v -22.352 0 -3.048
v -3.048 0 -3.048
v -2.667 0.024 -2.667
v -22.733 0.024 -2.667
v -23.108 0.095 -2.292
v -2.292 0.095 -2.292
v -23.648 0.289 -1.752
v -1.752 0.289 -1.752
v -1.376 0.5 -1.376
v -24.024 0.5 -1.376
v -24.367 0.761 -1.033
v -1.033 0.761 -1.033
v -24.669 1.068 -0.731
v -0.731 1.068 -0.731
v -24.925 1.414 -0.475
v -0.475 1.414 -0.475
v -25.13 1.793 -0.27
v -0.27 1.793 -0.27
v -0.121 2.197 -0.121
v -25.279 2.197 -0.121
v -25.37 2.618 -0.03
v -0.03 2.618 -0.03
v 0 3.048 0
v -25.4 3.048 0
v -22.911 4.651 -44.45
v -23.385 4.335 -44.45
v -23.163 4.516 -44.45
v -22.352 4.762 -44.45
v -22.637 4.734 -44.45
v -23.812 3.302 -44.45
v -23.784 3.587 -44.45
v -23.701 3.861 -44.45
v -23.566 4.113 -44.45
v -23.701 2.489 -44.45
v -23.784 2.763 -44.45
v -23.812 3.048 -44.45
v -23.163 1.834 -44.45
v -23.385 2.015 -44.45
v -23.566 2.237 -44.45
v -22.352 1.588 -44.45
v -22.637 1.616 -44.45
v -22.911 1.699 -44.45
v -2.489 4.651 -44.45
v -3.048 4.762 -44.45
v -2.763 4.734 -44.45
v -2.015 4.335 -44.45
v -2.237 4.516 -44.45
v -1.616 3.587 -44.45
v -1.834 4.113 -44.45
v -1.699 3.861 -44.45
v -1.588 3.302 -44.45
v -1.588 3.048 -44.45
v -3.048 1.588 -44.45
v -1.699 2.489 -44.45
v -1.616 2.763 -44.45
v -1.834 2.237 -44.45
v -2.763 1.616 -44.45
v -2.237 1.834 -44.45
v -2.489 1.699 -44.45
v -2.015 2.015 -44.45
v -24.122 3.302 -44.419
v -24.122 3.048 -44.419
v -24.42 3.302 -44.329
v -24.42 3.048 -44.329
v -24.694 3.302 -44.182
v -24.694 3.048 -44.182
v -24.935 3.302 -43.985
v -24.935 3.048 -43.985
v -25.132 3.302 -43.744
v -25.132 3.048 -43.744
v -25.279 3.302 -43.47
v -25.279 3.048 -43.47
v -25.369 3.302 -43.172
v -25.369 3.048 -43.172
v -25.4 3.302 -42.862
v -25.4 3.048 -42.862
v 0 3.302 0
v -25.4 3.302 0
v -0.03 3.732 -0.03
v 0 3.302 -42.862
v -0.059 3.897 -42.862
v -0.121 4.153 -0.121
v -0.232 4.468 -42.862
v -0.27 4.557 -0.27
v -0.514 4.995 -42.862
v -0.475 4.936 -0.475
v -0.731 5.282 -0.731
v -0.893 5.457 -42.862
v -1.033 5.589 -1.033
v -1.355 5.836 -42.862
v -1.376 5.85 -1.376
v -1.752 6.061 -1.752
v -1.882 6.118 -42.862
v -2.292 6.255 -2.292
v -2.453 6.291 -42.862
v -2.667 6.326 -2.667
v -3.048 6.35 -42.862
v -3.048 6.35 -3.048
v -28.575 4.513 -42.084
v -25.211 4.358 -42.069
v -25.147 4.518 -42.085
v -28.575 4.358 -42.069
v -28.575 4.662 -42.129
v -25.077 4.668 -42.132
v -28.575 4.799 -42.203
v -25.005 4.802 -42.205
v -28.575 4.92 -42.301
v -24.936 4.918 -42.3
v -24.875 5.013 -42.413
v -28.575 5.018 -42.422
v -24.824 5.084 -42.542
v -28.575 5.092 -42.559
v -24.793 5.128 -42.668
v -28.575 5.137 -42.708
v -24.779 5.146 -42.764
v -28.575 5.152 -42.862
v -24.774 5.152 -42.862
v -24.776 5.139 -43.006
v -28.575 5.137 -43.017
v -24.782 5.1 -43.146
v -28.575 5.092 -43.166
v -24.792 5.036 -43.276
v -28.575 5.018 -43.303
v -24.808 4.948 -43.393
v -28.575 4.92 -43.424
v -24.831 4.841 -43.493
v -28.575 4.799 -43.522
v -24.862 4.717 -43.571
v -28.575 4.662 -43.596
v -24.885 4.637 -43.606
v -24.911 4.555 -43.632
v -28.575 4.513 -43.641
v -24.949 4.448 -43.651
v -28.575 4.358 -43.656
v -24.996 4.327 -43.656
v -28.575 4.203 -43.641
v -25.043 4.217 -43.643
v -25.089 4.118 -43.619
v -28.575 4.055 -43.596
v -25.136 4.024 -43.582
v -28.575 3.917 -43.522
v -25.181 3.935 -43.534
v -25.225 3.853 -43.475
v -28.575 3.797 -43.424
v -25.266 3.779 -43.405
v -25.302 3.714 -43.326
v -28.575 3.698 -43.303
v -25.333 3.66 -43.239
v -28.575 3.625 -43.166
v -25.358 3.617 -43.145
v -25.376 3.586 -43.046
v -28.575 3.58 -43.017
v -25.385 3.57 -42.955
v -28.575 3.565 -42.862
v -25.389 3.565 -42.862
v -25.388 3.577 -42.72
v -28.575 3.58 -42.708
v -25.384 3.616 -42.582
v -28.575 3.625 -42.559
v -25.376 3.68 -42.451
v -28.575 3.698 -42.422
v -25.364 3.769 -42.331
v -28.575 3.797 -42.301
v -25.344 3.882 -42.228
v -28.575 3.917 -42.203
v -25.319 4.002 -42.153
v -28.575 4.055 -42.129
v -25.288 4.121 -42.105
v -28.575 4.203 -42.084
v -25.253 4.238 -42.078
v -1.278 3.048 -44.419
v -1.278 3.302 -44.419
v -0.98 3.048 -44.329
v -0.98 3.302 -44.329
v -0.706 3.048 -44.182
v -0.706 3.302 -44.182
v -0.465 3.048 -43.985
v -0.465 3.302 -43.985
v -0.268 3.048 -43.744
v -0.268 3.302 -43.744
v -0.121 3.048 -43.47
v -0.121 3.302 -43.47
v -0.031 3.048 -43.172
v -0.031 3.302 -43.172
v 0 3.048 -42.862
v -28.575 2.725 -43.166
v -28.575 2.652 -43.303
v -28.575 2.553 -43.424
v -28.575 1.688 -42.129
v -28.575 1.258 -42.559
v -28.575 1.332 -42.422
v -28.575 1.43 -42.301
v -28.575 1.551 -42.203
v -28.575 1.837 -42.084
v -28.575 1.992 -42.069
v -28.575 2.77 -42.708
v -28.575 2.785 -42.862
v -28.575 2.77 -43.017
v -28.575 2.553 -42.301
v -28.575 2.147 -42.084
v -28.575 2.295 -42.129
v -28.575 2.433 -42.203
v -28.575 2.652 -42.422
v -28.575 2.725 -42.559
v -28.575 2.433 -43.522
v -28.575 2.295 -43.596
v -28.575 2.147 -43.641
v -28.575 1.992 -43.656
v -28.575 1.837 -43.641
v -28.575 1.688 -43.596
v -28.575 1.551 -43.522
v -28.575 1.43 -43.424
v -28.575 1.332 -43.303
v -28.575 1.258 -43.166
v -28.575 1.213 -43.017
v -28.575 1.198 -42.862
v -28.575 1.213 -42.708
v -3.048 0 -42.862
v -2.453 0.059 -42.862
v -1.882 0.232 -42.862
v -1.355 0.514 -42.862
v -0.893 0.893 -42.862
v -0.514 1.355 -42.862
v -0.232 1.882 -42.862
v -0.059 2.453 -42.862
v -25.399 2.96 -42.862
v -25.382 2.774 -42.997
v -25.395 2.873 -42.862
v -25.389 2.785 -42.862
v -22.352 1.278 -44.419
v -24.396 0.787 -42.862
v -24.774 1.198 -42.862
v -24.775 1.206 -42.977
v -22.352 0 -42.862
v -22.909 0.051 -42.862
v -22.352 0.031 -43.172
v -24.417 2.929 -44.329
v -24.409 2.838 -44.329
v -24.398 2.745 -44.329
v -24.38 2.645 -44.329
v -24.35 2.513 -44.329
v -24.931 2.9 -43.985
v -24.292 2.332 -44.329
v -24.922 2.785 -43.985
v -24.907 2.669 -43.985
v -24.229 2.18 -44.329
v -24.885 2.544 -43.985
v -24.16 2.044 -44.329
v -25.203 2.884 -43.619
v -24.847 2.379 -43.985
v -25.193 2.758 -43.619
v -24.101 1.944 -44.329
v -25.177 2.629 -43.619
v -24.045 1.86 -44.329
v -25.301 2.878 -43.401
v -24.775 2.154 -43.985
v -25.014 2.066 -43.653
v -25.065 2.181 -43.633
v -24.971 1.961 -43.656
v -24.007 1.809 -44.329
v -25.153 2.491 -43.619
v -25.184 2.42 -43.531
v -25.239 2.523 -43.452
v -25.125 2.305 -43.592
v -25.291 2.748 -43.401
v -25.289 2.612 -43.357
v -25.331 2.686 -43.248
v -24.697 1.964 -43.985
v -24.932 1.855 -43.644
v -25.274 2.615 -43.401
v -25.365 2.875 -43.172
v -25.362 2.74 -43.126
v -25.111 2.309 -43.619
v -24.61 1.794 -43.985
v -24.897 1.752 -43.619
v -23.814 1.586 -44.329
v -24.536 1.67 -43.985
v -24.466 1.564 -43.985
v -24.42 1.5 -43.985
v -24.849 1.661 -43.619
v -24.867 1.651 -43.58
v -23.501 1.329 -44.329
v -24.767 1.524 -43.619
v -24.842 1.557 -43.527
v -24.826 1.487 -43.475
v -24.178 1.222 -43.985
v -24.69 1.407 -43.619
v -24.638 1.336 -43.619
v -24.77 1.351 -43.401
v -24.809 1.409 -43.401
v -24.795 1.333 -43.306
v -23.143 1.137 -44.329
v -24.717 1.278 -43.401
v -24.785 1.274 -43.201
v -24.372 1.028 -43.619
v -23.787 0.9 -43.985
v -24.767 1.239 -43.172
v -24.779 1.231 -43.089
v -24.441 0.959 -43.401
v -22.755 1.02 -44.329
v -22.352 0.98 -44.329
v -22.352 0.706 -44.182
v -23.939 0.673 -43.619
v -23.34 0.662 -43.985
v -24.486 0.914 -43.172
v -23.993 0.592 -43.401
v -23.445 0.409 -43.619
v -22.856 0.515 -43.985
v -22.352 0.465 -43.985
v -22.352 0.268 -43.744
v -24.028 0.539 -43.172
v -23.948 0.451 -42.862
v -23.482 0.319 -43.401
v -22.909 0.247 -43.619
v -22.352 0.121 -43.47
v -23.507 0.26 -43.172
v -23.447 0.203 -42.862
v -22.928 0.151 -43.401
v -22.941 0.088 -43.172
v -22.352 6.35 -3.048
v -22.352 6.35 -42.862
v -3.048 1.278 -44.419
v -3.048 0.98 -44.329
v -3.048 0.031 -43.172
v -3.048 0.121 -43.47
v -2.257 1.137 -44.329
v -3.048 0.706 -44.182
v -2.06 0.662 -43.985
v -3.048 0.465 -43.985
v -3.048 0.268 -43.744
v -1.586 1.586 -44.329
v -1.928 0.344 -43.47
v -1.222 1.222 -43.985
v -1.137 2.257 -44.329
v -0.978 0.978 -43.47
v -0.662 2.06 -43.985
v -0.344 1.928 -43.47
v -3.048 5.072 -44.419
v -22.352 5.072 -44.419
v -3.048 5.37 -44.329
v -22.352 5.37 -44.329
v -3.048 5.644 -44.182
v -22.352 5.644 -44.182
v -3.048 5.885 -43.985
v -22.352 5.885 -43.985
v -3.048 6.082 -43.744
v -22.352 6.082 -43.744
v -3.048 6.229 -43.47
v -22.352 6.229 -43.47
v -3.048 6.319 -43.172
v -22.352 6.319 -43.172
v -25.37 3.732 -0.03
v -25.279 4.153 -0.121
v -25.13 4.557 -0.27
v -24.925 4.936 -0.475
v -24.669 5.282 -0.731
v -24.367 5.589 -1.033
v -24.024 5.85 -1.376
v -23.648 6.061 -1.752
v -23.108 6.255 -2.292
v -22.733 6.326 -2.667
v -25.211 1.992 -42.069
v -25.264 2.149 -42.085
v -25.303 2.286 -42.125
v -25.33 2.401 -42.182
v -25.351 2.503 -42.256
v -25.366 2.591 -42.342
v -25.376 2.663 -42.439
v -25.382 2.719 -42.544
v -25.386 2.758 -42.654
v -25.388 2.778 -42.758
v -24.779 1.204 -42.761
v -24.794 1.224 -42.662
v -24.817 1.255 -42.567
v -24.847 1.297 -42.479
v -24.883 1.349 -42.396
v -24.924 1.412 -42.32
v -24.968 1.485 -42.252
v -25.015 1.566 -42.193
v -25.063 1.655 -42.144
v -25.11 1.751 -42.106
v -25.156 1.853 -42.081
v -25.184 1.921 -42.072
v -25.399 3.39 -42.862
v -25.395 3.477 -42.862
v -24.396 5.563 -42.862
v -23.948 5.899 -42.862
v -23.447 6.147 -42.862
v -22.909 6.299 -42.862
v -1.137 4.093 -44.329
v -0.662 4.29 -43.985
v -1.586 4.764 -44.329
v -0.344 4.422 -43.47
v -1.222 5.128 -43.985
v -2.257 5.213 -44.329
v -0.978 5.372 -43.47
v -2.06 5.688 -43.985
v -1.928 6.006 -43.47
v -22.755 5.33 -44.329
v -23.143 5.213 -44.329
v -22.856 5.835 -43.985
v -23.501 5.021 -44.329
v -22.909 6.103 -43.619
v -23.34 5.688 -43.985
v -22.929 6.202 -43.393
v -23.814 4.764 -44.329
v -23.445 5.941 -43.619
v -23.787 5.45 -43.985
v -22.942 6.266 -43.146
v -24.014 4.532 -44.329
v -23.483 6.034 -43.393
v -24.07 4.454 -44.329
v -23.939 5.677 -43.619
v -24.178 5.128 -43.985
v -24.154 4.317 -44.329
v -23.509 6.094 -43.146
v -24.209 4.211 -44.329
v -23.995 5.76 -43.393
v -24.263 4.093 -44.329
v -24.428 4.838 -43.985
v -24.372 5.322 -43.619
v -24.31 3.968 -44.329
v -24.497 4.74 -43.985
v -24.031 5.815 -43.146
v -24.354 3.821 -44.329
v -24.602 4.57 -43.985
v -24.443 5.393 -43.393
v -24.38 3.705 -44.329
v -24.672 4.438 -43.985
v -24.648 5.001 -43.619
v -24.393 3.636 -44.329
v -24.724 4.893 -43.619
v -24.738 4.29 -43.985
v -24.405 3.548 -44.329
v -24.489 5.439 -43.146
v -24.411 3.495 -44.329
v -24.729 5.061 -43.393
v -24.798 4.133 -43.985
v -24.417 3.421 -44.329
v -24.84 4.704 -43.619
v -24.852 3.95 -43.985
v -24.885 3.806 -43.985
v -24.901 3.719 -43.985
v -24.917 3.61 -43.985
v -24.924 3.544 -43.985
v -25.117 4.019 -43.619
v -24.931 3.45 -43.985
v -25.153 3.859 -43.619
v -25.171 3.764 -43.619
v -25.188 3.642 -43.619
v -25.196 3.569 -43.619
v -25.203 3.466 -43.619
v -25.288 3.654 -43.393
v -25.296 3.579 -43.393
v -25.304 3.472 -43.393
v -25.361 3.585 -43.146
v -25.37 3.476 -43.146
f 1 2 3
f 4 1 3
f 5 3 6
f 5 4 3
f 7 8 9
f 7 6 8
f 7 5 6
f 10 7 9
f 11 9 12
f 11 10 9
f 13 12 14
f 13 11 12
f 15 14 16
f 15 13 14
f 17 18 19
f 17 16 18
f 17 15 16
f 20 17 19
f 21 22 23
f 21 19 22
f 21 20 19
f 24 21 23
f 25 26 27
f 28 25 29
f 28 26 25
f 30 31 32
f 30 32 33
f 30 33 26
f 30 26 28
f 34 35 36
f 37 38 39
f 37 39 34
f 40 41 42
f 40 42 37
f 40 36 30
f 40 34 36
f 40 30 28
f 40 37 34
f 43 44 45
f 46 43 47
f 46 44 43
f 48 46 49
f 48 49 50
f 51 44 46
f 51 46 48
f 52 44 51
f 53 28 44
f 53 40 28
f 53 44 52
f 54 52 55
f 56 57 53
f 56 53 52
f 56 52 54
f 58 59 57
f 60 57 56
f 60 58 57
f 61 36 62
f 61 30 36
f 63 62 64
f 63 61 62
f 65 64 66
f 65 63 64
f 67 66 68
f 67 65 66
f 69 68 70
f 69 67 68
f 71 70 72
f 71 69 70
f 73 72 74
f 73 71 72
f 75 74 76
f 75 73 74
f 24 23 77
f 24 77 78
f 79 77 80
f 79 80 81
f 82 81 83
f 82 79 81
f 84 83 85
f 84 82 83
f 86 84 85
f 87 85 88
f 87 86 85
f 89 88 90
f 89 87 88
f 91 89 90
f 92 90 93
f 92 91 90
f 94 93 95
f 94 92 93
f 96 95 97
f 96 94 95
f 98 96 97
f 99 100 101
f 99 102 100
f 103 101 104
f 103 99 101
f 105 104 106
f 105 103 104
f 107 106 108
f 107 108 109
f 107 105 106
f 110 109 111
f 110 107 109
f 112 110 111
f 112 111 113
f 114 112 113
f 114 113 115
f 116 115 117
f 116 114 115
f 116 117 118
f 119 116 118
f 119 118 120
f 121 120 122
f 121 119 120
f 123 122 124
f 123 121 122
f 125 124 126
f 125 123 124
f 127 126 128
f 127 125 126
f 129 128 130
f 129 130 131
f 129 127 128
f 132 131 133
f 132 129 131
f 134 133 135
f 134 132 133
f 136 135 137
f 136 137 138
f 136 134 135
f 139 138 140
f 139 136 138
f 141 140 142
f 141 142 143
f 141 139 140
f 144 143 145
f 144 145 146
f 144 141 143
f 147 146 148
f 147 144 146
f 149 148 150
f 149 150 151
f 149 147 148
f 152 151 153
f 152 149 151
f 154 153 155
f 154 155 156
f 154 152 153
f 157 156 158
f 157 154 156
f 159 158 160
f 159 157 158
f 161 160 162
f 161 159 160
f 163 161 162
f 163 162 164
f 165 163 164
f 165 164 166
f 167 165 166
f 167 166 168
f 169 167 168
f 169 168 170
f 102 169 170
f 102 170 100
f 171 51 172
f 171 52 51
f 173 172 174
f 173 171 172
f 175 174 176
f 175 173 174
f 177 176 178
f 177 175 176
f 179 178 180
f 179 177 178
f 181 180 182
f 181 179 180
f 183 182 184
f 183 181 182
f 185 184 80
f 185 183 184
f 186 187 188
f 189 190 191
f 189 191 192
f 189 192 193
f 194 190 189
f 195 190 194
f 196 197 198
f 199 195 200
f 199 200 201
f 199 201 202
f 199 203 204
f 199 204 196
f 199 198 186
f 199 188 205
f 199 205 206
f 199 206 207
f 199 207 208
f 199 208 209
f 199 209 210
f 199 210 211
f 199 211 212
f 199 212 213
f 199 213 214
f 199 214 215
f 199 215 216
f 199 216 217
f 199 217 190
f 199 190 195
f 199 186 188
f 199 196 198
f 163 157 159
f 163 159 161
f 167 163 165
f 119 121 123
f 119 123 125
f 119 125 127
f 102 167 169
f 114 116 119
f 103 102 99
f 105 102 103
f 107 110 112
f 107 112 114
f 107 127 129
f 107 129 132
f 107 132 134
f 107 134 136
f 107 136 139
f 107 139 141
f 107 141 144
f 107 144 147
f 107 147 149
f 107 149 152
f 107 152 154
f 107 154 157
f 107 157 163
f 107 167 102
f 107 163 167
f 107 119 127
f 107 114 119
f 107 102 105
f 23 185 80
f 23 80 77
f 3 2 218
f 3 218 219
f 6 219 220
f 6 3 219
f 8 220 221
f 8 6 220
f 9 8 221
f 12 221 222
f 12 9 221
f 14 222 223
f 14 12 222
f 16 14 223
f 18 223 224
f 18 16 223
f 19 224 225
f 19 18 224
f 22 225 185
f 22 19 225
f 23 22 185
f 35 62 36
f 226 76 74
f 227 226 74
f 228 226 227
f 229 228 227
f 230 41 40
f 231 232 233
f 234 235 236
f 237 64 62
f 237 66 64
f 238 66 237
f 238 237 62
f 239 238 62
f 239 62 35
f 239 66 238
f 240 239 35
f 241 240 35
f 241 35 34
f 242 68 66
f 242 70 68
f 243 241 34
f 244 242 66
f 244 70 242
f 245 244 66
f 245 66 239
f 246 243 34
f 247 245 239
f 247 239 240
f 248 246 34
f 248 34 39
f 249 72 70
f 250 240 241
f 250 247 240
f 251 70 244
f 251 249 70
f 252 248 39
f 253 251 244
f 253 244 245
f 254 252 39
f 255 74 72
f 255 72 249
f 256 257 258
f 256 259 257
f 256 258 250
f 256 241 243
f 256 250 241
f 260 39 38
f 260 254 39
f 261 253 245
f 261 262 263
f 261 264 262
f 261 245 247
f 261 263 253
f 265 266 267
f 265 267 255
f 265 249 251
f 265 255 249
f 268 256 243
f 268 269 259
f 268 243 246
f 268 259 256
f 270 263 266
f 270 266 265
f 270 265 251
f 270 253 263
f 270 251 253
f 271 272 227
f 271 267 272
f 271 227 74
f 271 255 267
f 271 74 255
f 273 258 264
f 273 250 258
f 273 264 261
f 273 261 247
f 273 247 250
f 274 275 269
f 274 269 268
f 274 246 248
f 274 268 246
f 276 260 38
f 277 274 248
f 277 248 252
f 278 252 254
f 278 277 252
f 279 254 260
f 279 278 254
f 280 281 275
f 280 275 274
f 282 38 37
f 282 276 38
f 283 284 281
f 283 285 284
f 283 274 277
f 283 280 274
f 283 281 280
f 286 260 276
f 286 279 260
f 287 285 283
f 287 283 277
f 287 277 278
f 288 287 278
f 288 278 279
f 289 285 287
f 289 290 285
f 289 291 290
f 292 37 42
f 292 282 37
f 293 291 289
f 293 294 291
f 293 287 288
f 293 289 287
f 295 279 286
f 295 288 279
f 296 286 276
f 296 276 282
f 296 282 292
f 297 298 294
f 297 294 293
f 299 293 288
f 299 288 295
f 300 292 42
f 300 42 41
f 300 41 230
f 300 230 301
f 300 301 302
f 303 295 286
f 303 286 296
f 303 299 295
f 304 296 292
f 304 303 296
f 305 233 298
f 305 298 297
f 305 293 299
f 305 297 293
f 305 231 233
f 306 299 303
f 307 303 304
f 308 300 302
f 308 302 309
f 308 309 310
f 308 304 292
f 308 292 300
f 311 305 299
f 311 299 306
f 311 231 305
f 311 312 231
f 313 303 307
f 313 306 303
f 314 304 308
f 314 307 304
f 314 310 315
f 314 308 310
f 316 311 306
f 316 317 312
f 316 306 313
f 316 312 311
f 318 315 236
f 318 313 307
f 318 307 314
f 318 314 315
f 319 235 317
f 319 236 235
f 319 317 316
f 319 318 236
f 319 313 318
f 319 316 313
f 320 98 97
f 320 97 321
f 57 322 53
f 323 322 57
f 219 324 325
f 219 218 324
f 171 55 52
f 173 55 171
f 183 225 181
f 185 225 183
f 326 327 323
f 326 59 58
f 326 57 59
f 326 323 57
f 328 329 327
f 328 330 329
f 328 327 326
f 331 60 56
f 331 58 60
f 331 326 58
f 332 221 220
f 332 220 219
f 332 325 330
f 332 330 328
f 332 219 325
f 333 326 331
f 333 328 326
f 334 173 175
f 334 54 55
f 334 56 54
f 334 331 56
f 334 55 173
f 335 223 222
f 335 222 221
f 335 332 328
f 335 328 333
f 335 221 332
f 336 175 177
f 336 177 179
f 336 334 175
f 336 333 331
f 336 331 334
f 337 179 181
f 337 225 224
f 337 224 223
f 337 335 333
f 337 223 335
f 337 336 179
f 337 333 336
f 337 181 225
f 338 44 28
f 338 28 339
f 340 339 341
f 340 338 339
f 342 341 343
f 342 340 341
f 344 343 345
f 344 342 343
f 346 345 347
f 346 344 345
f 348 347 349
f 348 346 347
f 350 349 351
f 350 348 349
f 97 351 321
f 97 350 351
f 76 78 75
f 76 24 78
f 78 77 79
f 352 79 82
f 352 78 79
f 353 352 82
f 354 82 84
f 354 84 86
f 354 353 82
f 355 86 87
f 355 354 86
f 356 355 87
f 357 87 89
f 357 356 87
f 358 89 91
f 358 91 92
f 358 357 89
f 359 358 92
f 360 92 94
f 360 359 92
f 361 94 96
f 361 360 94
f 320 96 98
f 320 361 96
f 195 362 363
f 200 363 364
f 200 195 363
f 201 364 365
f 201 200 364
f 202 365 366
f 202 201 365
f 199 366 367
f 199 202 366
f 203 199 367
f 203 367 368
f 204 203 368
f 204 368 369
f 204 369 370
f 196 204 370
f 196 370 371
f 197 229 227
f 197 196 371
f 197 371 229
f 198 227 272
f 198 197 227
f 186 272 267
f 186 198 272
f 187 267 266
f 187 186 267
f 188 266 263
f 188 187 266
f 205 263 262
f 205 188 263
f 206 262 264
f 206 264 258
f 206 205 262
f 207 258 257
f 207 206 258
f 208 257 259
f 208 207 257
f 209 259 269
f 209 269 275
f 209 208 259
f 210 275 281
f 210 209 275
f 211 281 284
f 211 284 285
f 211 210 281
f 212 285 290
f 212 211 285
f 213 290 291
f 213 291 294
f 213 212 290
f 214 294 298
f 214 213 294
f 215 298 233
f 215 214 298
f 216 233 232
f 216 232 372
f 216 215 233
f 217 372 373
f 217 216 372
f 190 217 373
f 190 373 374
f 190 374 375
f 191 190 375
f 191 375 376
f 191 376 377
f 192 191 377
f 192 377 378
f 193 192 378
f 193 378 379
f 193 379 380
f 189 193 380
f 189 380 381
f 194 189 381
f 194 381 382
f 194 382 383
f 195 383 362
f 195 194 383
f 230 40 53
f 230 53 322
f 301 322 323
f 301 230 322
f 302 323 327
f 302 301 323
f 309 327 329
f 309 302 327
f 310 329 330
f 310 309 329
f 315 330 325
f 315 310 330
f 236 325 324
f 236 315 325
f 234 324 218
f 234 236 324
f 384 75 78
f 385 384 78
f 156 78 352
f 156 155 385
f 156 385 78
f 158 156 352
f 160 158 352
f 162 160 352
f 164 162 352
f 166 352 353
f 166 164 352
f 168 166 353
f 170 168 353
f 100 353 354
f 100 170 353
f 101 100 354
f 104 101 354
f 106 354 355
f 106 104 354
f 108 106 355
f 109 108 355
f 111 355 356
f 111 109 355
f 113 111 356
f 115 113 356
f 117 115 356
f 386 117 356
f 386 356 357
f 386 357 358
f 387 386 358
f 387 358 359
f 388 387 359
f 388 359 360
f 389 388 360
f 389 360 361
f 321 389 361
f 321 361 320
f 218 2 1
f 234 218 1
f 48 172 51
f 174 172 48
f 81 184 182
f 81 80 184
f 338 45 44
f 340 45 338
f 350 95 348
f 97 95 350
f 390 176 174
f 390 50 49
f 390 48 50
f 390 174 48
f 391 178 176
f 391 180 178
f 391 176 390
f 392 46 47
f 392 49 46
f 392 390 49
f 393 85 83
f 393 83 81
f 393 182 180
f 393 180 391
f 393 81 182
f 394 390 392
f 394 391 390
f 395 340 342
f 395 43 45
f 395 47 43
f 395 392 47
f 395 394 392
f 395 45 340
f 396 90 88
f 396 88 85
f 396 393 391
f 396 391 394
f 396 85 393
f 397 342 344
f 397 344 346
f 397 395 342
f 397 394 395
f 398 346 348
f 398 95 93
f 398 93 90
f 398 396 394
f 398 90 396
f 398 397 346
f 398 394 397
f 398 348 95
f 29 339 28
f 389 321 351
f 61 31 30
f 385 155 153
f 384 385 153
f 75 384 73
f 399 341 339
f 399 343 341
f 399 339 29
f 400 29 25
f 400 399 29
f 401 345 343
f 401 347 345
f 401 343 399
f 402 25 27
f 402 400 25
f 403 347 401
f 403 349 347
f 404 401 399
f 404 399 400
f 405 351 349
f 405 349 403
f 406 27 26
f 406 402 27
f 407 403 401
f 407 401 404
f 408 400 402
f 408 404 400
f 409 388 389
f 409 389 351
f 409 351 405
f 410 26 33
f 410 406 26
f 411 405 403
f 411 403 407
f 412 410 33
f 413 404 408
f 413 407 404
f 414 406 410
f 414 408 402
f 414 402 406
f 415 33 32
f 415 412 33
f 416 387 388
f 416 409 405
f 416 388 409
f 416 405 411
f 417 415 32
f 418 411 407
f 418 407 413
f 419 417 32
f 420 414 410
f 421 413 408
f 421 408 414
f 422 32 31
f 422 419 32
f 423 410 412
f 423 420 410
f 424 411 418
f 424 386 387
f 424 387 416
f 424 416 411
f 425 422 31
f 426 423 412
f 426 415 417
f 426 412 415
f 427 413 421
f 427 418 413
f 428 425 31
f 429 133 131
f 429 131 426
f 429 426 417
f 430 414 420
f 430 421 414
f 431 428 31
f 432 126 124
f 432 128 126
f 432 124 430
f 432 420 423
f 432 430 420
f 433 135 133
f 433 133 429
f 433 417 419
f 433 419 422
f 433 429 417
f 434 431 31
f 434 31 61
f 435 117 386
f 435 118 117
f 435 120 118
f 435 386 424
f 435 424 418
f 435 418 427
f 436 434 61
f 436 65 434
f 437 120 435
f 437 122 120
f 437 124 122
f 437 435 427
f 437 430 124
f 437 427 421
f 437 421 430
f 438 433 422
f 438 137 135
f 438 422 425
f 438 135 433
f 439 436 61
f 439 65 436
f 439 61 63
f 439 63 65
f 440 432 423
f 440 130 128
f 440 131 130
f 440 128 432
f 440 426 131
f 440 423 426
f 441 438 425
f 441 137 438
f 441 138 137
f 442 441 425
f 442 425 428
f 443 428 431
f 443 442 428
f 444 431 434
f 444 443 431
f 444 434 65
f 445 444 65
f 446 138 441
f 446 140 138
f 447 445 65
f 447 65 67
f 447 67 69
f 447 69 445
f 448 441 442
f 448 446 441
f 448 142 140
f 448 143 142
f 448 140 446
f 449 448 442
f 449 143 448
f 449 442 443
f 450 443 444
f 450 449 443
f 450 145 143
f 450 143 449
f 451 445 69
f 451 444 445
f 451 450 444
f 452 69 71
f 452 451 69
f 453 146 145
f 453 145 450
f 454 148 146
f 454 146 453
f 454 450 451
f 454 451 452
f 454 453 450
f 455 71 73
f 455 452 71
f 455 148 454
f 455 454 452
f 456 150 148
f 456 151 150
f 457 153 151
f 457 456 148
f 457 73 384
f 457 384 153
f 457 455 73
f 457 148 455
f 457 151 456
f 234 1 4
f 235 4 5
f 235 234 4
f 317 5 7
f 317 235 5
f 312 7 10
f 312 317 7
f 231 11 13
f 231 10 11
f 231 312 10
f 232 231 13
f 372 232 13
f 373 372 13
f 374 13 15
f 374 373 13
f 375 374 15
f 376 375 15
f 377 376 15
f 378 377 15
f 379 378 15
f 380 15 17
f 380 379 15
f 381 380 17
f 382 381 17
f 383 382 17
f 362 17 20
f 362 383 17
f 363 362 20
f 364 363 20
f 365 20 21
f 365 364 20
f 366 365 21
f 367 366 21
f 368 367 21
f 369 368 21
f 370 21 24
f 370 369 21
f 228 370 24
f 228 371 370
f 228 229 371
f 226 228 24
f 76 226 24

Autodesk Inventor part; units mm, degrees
ref_plane "YZ Plane" through (0, 0, 0) normal (1, 0, 0) x (0, 1, 0)
ref_plane "XZ Plane" through (0, 0, 0) normal (0, 1, 0) x (-1, 0, 0)
ref_plane "XY Plane" through (0, 0, 0) normal (0, 0, 1) x (1, 0, 0)
sketch "Sketch1" plane through (0, 0, 0) normal (0, 1, 0) x (-1, 0, 0)
  line L0 (0, 0) -> (25.4, 0)
  line L1 (25.4, 0) -> (25.4, -44.45)
  line L2 (25.4, -44.45) -> (0, -44.45)
  line L3 (0, -44.45) -> (0, 0)
  dimension "d0" = 25.4
  dimension "d1" = 44.45
extrude "Extrusion1" add sketch "Sketch1" along normal blind 6.35
fillet "Fillet1" radius 3.048 6 edges at (0, 6.35, -22.225) (0, 0, -22.225) (-12.7, 0, 0) (-12.7, 6.35, 0) (-25.4, 6.35, -22.225) (-25.4, 0, -22.225)
fillet "Fillet2" radius 1.5875 4 edges at (-24.5073, 5.4573, -44.45) (-12.7, 0, -44.45) (-0.8927, 5.4573, -44.45) (-12.7, 6.35, -44.45)
sketch "Sketch2" plane through (-25.4, 3.048, -42.8625) normal (-1, 0, 0) x (0, 0, 1)
  line L0 (0, 0.254) -> (0, 0) projected
  line L1 (0, 0.127) -> (2.6469, 0.127)
  circle A0 centre (0, 1.3103) radius 0.7937
  circle A1 centre (0, -1.0563) radius 0.7937
  point P0 (42.8625, -3.048)
  dimension "d6" = 1.5875
extrude "Extrusion2" add sketch "Sketch2" along normal mid plane 6.35
properties part number "600mah Battery"
